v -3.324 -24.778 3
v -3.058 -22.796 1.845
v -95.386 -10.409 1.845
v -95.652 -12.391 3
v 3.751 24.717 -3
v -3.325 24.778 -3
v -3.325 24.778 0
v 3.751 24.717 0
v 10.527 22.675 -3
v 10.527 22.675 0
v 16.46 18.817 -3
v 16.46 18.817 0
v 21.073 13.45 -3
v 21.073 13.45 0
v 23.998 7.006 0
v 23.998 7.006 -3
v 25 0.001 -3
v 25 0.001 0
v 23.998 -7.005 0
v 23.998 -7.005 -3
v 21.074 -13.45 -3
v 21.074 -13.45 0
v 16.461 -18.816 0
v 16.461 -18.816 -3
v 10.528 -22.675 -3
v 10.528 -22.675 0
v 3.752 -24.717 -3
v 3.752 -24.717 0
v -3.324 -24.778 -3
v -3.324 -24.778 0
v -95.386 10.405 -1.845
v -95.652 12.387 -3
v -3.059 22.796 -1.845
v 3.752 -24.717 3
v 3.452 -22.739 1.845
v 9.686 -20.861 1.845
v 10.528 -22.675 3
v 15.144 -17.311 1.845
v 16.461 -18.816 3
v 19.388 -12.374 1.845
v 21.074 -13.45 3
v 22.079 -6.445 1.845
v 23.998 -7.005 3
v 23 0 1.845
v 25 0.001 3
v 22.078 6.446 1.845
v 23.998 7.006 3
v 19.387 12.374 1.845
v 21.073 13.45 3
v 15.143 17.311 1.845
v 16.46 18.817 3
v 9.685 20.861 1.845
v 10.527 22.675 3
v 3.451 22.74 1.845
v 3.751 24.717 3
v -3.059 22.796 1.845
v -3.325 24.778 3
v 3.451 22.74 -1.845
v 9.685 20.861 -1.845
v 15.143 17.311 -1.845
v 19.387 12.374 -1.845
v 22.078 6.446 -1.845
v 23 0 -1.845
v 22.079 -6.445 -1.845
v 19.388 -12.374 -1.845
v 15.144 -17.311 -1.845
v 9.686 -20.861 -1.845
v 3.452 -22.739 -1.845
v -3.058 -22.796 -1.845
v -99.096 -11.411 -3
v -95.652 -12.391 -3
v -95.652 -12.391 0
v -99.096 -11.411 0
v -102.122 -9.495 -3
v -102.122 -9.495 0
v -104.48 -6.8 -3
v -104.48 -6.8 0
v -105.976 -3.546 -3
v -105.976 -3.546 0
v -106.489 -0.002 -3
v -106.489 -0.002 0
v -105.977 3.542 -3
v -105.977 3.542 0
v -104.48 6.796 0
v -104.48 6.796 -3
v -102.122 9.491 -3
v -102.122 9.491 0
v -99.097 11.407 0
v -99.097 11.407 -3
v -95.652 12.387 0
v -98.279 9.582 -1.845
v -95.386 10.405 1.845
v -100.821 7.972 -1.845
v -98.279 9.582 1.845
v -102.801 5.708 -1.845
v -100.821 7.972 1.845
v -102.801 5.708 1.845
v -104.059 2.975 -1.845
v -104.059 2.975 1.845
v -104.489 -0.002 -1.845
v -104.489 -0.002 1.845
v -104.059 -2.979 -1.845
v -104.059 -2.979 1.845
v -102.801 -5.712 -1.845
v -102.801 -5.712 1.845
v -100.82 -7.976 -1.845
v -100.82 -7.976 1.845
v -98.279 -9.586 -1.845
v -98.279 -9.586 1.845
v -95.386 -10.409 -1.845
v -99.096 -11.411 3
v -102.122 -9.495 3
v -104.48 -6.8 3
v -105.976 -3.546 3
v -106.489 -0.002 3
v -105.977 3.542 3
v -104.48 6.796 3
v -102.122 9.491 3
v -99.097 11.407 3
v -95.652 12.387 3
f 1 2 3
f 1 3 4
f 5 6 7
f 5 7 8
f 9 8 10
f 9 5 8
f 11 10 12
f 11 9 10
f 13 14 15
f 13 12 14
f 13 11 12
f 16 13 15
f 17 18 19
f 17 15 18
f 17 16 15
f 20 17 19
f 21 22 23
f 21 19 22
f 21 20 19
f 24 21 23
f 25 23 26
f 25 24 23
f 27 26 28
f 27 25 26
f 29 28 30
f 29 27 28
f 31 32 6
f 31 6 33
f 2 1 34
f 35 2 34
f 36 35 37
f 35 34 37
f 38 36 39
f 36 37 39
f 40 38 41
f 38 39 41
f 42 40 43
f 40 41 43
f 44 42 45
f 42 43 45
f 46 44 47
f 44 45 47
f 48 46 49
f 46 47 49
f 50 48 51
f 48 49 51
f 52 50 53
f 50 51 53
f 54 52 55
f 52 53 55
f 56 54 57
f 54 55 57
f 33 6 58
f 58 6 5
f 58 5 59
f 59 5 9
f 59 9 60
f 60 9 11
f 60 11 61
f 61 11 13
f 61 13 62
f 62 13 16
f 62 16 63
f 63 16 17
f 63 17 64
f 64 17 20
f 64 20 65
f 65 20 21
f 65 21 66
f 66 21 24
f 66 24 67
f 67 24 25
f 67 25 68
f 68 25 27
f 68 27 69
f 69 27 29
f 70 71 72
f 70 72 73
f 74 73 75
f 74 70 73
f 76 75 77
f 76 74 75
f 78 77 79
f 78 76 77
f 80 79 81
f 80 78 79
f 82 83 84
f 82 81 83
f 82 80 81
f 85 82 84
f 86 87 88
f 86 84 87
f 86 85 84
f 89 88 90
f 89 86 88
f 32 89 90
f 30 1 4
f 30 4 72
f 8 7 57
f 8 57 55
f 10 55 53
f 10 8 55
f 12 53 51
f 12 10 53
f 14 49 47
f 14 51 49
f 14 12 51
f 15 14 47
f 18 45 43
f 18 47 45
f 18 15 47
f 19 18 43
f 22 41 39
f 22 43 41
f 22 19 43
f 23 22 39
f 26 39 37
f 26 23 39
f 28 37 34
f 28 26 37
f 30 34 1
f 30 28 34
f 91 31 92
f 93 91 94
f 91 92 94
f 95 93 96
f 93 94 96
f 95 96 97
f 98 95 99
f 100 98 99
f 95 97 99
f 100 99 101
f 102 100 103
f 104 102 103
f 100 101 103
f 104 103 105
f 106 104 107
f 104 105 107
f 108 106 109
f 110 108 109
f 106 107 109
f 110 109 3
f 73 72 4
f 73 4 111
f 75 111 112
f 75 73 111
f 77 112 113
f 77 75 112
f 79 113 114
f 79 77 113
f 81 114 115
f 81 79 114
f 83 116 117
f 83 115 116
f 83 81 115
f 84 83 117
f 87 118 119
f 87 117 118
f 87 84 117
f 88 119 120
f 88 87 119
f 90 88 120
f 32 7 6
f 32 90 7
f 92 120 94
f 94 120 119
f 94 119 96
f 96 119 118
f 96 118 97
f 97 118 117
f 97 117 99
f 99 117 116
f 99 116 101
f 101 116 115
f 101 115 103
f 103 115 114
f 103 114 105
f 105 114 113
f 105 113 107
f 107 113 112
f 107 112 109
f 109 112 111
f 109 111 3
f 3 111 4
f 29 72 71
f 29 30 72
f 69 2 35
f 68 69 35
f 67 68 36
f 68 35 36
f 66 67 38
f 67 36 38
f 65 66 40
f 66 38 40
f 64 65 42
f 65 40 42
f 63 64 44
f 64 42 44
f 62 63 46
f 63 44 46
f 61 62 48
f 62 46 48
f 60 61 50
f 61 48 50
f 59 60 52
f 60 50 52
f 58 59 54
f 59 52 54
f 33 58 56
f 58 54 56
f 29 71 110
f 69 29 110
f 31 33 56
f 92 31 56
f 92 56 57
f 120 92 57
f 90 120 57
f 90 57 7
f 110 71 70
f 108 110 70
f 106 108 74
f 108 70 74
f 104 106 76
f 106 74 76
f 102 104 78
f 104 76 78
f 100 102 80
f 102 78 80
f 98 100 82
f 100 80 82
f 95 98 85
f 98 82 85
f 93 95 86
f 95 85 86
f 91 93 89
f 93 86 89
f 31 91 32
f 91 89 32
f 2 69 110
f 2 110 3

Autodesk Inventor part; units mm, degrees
ref_plane "YZ Plane" through (0, 0, 0) normal (1, 0, 0) x (0, 1, 0)
ref_plane "XZ Plane" through (0, 0, 0) normal (0, 1, 0) x (-1, 0, 0)
sketch "Sketch1" plane through (0, 0, 0) normal (0, 0, 1) x (1, 0, 0)
  arc A0 (-3.0584, -22.7957) -> (-3.0593, 22.7956) centre (0, 0) ccw
  arc A1 (-95.3861, 10.4049) -> (-95.3857, -10.4086) centre (-93.9895, -0.0018) ccw
  line L0 (-95.3861, 10.4049) -> (-3.0593, 22.7956)
  line L1 (-95.3857, -10.4086) -> (-3.0584, -22.7957)
  dimension "d0" = 46
  dimension "d1" = 21
ref_plane "Work Plane1" through (-3.0593, 22.7956, 0) normal (-0.9911143, -0.1330127, 0) x (0.1330127, -0.9911143, 0)
sketch "Sketch2" plane through (-3.0593, 22.7956, 0) normal (-0.9911143, -0.1330127, 0) x (0.1330127, -0.9911143, 0)
  line L0 (-2, 0) -> (-2, 3)
  line L1 (-2, 0) -> (-2, -3)
  line L2 (-2, -3) -> (0, -1.8453)
  line L3 (0, -1.8453) -> (0, 1.8453)
  line L4 (0, 1.8453) -> (-2, 3)
  point P0 (23, 0)
  dimension "d4" = 3
  dimension "d5" = 3
  dimension "d6" = 60
  dimension "d7" = 60
  dimension "d8" = 2
sweep "Sweep1" add profiles "Sketch2" path "Sketch1"
properties part number "Dây đai"
